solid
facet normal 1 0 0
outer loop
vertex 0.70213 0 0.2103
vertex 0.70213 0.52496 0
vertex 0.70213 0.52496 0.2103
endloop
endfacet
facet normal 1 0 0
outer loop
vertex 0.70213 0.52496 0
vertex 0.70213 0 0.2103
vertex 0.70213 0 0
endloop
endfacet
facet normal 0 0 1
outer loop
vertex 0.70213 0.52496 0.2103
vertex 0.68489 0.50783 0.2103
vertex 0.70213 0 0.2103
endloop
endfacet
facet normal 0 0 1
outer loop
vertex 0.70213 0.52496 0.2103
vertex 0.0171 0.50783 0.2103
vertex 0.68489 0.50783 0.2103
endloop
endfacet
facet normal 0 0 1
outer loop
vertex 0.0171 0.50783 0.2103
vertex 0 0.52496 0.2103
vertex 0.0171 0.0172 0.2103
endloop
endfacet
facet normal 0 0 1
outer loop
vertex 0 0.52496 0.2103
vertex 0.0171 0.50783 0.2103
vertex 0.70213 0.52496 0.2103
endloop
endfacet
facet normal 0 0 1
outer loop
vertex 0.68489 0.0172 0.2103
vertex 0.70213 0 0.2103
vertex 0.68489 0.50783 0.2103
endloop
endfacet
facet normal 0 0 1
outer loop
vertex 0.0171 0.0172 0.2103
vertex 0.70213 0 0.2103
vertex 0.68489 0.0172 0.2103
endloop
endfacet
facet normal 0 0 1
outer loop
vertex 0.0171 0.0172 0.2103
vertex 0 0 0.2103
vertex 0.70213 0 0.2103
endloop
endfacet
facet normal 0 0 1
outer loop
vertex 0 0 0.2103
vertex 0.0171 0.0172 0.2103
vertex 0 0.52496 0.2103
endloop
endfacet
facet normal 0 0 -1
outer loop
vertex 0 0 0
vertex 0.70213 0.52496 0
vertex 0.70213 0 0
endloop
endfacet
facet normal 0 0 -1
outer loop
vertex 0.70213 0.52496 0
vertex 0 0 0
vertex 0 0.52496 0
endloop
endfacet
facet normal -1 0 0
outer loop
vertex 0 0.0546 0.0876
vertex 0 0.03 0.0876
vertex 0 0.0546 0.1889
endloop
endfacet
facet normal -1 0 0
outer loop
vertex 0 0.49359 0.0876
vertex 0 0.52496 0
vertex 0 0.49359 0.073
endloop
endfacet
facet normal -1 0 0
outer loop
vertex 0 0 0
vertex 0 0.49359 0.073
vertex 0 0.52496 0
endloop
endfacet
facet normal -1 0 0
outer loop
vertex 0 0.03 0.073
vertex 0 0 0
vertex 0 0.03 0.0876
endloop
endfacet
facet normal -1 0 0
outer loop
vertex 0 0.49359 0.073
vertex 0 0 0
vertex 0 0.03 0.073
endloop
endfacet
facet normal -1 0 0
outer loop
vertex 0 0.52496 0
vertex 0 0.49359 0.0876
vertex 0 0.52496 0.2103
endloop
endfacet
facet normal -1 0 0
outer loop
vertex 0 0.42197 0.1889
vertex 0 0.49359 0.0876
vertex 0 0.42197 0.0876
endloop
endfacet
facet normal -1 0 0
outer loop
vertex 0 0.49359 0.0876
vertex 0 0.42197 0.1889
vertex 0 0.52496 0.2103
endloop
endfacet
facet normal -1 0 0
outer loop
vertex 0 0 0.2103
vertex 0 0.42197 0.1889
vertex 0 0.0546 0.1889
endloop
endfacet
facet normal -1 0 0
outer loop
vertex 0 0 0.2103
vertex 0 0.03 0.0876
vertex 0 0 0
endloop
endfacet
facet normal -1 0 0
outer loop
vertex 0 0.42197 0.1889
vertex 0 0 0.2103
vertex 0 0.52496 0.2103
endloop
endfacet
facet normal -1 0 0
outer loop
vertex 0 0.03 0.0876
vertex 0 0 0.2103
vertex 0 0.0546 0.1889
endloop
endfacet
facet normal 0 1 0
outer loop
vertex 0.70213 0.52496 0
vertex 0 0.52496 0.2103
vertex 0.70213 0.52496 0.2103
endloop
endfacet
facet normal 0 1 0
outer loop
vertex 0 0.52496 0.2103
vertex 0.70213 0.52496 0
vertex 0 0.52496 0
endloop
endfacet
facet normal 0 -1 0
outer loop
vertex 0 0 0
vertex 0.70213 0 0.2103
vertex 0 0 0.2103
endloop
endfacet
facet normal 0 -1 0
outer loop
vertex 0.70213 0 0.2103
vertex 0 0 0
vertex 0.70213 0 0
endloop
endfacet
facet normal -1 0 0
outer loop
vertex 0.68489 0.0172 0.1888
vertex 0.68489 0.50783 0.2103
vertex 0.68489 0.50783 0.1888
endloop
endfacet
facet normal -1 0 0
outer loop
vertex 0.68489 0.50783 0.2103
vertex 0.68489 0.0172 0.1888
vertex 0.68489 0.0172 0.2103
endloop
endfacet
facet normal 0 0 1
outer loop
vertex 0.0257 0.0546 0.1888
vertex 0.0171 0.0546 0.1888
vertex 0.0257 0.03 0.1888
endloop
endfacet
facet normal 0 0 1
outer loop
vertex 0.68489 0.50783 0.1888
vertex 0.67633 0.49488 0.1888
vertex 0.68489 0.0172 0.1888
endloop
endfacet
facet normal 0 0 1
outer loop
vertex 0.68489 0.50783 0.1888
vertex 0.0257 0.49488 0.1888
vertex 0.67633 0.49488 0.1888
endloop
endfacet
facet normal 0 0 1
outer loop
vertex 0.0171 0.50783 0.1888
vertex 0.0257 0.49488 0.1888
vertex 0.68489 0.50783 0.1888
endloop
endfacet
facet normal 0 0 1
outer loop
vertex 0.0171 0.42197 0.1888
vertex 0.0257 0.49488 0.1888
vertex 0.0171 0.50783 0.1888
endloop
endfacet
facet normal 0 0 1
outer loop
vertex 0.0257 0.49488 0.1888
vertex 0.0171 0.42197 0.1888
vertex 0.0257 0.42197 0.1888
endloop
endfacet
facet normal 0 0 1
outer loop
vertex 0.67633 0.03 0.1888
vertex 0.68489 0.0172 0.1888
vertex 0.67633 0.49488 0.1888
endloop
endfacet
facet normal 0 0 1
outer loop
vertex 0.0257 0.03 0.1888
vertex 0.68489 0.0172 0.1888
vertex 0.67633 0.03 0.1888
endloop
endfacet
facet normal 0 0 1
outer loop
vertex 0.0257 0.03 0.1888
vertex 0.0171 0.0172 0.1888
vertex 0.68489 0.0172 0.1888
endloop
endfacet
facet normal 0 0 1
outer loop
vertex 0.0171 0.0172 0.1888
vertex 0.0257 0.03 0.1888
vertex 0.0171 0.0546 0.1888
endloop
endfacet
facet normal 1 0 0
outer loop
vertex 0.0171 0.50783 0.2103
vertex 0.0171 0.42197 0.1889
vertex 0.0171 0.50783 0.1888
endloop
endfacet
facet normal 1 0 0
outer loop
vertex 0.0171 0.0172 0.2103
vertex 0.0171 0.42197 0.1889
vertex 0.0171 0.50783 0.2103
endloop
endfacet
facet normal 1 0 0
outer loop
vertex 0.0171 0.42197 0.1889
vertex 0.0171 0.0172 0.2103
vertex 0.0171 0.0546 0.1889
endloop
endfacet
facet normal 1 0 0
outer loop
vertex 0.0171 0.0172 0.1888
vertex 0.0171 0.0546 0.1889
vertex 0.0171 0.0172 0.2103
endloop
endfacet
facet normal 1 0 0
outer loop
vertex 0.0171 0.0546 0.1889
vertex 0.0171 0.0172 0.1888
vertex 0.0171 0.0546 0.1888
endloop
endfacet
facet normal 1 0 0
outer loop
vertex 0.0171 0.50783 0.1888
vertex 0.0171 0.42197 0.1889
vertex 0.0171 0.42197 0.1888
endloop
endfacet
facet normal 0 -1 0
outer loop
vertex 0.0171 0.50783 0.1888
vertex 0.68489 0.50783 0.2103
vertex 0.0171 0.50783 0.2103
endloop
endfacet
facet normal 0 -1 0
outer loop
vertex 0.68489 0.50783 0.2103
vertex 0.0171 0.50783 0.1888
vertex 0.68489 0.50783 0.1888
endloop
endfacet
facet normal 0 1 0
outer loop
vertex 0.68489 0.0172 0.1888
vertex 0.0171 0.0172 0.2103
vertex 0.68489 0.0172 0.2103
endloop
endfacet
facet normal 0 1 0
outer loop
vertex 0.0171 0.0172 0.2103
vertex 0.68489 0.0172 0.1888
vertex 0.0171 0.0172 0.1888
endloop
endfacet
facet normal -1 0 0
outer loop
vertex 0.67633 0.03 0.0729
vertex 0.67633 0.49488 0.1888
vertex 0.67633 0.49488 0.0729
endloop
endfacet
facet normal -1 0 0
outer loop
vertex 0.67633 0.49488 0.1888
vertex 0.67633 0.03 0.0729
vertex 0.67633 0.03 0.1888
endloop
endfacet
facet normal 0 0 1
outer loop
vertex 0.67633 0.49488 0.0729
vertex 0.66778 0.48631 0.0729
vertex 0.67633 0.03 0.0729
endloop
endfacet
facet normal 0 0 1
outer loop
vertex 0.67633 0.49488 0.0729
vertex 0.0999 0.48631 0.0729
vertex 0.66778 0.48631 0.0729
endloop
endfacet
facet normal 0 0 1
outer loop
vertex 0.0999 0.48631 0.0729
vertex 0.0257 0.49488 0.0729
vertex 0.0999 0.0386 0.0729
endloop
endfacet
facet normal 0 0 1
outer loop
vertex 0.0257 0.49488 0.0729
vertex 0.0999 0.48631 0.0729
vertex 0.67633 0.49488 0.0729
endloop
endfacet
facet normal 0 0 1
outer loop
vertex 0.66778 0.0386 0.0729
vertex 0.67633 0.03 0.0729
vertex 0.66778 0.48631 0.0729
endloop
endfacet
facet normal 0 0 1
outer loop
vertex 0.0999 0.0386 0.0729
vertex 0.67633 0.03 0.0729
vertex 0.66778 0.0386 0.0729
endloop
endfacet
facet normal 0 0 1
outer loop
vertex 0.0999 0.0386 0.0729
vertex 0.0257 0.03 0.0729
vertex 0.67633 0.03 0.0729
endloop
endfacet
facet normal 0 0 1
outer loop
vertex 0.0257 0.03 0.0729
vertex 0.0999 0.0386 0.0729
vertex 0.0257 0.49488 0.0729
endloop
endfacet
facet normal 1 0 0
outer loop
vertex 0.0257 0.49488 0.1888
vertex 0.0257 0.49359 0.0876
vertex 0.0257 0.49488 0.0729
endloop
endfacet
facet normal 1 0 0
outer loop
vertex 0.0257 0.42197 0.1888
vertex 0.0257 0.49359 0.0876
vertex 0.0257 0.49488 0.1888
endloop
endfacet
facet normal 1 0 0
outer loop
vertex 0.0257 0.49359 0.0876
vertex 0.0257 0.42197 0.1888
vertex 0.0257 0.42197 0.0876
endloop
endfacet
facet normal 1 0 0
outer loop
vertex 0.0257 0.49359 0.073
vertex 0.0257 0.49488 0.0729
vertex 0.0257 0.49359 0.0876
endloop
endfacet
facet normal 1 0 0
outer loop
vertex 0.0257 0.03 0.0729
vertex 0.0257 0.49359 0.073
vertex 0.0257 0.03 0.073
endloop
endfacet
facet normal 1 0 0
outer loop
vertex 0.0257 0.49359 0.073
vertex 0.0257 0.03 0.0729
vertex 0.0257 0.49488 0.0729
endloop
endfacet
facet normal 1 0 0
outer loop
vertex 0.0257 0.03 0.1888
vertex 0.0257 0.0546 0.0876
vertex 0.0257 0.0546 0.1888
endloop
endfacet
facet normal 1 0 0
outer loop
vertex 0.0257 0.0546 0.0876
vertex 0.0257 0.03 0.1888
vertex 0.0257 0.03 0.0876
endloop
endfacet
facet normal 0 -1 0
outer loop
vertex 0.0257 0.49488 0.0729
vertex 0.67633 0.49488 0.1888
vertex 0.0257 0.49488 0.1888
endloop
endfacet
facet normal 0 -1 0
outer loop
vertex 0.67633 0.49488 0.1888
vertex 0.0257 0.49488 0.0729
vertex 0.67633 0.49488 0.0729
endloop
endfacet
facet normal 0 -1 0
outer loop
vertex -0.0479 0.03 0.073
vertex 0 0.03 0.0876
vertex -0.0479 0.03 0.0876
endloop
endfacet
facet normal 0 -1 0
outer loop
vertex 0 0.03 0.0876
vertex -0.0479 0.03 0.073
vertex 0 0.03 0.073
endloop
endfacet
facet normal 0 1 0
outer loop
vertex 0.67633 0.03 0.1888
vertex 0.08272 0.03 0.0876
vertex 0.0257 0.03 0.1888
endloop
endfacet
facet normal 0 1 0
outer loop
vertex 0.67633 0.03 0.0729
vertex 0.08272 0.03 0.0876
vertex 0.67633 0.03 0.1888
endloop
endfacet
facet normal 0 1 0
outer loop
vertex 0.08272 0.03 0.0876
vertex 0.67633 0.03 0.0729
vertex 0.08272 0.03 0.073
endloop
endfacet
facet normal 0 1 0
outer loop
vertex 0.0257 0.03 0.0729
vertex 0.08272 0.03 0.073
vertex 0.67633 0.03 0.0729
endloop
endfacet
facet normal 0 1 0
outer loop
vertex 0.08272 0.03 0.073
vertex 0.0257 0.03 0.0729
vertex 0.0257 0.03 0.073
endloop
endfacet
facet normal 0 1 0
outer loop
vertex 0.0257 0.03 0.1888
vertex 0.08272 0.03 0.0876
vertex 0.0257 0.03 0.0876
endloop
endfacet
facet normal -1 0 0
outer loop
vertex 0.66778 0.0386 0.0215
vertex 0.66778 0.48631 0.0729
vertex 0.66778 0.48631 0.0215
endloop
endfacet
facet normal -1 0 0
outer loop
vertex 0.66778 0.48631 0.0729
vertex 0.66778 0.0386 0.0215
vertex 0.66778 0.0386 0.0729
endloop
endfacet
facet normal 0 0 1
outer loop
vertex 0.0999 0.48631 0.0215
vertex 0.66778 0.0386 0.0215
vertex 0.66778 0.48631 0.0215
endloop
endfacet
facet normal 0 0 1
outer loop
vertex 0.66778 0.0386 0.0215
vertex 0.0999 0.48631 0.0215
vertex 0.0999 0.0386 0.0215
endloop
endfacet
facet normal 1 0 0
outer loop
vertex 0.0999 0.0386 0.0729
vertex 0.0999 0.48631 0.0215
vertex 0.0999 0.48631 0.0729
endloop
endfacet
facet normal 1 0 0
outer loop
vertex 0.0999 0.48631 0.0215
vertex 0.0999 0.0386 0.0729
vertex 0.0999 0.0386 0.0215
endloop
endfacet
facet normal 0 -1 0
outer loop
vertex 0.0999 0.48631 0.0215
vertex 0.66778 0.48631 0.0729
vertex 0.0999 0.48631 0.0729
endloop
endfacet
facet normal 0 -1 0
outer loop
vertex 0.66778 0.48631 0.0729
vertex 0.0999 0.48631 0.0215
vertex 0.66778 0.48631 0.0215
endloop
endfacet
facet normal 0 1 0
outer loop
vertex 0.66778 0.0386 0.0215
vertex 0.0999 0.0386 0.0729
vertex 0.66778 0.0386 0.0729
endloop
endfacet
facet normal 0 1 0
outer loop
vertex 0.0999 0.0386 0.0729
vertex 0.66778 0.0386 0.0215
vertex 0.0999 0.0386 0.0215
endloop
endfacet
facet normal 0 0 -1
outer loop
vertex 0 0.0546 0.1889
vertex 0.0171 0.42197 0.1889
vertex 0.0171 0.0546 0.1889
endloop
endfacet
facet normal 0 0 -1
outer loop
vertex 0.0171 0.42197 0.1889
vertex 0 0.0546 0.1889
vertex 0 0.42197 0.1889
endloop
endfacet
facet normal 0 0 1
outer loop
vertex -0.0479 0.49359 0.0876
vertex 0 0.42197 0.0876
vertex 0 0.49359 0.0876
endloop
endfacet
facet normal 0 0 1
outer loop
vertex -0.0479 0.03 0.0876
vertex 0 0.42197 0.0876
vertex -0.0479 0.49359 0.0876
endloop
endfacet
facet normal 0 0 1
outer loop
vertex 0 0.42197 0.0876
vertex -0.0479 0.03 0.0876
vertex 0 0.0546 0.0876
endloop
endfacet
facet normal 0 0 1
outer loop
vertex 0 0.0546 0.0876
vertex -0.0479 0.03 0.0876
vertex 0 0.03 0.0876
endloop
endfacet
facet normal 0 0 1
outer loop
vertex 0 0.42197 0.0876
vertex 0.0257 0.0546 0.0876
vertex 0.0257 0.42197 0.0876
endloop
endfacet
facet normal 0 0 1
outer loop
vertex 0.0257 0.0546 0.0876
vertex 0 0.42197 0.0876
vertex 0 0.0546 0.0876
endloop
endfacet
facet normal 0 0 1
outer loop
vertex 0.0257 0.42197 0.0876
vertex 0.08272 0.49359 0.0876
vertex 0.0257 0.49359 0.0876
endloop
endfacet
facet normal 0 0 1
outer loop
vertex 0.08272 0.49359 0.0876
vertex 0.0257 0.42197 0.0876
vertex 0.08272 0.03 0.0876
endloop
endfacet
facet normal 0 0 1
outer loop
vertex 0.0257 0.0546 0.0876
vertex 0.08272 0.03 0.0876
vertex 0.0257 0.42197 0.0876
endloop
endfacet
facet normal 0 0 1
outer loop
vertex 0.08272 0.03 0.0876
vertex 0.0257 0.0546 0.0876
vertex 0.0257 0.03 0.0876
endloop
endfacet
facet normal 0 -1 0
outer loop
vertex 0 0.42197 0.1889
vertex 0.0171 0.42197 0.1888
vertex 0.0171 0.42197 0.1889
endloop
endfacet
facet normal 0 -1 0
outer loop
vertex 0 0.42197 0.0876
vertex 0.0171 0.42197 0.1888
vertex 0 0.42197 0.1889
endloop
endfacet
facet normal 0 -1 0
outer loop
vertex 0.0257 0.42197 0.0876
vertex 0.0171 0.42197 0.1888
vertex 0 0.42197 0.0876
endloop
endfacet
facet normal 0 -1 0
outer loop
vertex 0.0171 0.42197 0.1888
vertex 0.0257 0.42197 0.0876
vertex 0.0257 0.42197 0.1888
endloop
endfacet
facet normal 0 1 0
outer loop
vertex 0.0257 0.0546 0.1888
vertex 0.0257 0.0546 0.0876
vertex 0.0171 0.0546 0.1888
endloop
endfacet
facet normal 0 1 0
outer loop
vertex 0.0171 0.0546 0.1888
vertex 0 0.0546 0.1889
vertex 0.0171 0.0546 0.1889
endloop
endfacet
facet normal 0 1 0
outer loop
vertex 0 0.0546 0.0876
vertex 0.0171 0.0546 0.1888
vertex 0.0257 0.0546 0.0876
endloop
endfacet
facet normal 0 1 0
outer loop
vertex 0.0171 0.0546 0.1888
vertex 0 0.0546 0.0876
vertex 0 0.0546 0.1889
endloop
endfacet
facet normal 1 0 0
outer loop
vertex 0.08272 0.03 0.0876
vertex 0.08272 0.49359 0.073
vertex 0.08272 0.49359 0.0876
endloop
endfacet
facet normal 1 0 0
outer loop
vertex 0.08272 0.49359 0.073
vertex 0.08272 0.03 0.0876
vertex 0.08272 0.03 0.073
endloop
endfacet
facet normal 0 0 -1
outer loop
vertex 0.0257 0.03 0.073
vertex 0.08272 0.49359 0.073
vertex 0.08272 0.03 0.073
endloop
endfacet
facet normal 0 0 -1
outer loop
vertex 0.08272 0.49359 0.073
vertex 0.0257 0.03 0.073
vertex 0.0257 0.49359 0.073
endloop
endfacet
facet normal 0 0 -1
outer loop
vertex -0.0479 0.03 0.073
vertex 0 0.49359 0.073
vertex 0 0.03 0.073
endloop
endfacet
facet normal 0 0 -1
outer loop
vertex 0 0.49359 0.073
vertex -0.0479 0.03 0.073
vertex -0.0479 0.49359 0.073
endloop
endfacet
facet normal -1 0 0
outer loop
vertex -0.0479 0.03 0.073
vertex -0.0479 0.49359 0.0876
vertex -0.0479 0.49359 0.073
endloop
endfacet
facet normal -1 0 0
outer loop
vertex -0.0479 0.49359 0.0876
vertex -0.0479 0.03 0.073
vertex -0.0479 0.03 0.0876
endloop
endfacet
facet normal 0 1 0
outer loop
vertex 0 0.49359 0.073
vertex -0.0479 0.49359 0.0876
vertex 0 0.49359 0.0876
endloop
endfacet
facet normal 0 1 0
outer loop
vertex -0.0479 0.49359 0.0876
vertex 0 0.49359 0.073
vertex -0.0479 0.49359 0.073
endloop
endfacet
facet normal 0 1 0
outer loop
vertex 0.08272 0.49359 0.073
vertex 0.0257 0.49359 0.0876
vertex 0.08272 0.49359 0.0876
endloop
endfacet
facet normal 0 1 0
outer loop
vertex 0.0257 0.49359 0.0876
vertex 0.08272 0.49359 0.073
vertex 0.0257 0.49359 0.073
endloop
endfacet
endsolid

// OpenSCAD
// Parameters
$fn = 50;

// Main body dimensions
body_l = 0.702127;  // overall length (X)
body_w = 0.524964;  // overall width (Y)
body_h = 0.2103;    // overall height (Z)

// Top shallow recess (band 0.1888 - 0.2103)
r1_l = 0.667793;    // recess length
r1_w = 0.490631;    // recess width
r1_inset_l = 0.0171;   // inset from left edge
r1_inset_r = 0.0172;   // inset from right edge
r1_inset_f = 0.0172;   // inset from front edge
r1_inset_b = 0.0172;   // inset from back edge
r1_z_bot = 0.1888;  // bottom of recess
r1_z_top = 0.2103;   // top of recess
r1_depth = 0.0215;  // recess depth

// Middle contained cut (band 0.0729 - 0.1888)
r2_l = 0.650626;
r2_w = 0.46488;
r2_inset_l = 0.0257;
r2_inset_r = 0.0258;
r2_inset_f = 0.03;
r2_inset_b = 0.0301;
r2_z_bot = 0.0729;
r2_z_top = 0.1888;
r2_depth = 0.1159;

// Lower offset pocket (band 0.0215 - 0.073)
r3_l = 0.567882;
r3_w = 0.447713;
r3_inset_l = 0.0999;
r3_inset_r = 0.0343;
r3_inset_f = 0.0386;
r3_inset_b = 0.0387;
r3_z_bot = 0.0215;
r3_z_top = 0.073;
r3_depth = 0.0515;
r3_bottom_thk = 0.0215;  // remaining floor thickness

// Side projection (added solid, band 0.073 - 0.0876)
sp_l = 0.130618;
sp_w = 0.463588;
sp_overhang_l = 0.0479;   // overhang past left edge
sp_to_right = 0.6194;     // distance to right edge
sp_inset_f = 0.03;
sp_inset_b = 0.0314;
sp_z_bot = 0.073;
sp_z_top = 0.0876;
sp_thk = 0.0146;

// Side recess at left edge (band 0.0876 - 0.1889)
sr_depth_x = 0.0343;   // cut depth into body (X)
sr_len_y = 0.367372;   // length of recess face (Y)
sr_face_h = 0.101285;  // height of recess face (Z)
sr_inset_f = 0.0546;
sr_inset_b = 0.103;
sr_to_right = 0.6678;  // remaining body length to right edge
sr_z_bot = 0.0876;
sr_z_top = 0.1889;

// Helper: axis-aligned box from corner point + size
module box(x, y, z, l, w, h) {
    translate([x, y, z]) cube([l, w, h]);
}

// Main body with all cuts
module main_body() {
    difference() {
        // Base rectangular solid
        box(0, 0, 0, body_l, body_w, body_h);

        // Top shallow recess
        box(r1_inset_l, r1_inset_f, r1_z_bot,
            r1_l, r1_w, r1_z_top - r1_z_bot);

        // Middle contained cut (continuation downward)
        box(r2_inset_l, r2_inset_f, r2_z_bot,
            r2_l, r2_w, r2_z_top - r2_z_bot);

        // Lower offset pocket (leaves bottom thickness)
        box(r3_inset_l, r3_inset_f, r3_z_bot,
            r3_l, r3_w, r3_z_top - r3_z_bot);

        // Side recess at left edge (partial depth, non-through)
        box(0, sr_inset_f, sr_z_bot,
            sr_depth_x, sr_len_y, sr_z_top - sr_z_bot);
    }
}

// Side projection solid
module side_projection() {
    box(-sp_overhang_l, sp_inset_f, sp_z_bot,
        sp_l, sp_w, sp_z_top - sp_z_bot);
}

// Final model: body with cuts plus side projection
main_body();
side_projection();
